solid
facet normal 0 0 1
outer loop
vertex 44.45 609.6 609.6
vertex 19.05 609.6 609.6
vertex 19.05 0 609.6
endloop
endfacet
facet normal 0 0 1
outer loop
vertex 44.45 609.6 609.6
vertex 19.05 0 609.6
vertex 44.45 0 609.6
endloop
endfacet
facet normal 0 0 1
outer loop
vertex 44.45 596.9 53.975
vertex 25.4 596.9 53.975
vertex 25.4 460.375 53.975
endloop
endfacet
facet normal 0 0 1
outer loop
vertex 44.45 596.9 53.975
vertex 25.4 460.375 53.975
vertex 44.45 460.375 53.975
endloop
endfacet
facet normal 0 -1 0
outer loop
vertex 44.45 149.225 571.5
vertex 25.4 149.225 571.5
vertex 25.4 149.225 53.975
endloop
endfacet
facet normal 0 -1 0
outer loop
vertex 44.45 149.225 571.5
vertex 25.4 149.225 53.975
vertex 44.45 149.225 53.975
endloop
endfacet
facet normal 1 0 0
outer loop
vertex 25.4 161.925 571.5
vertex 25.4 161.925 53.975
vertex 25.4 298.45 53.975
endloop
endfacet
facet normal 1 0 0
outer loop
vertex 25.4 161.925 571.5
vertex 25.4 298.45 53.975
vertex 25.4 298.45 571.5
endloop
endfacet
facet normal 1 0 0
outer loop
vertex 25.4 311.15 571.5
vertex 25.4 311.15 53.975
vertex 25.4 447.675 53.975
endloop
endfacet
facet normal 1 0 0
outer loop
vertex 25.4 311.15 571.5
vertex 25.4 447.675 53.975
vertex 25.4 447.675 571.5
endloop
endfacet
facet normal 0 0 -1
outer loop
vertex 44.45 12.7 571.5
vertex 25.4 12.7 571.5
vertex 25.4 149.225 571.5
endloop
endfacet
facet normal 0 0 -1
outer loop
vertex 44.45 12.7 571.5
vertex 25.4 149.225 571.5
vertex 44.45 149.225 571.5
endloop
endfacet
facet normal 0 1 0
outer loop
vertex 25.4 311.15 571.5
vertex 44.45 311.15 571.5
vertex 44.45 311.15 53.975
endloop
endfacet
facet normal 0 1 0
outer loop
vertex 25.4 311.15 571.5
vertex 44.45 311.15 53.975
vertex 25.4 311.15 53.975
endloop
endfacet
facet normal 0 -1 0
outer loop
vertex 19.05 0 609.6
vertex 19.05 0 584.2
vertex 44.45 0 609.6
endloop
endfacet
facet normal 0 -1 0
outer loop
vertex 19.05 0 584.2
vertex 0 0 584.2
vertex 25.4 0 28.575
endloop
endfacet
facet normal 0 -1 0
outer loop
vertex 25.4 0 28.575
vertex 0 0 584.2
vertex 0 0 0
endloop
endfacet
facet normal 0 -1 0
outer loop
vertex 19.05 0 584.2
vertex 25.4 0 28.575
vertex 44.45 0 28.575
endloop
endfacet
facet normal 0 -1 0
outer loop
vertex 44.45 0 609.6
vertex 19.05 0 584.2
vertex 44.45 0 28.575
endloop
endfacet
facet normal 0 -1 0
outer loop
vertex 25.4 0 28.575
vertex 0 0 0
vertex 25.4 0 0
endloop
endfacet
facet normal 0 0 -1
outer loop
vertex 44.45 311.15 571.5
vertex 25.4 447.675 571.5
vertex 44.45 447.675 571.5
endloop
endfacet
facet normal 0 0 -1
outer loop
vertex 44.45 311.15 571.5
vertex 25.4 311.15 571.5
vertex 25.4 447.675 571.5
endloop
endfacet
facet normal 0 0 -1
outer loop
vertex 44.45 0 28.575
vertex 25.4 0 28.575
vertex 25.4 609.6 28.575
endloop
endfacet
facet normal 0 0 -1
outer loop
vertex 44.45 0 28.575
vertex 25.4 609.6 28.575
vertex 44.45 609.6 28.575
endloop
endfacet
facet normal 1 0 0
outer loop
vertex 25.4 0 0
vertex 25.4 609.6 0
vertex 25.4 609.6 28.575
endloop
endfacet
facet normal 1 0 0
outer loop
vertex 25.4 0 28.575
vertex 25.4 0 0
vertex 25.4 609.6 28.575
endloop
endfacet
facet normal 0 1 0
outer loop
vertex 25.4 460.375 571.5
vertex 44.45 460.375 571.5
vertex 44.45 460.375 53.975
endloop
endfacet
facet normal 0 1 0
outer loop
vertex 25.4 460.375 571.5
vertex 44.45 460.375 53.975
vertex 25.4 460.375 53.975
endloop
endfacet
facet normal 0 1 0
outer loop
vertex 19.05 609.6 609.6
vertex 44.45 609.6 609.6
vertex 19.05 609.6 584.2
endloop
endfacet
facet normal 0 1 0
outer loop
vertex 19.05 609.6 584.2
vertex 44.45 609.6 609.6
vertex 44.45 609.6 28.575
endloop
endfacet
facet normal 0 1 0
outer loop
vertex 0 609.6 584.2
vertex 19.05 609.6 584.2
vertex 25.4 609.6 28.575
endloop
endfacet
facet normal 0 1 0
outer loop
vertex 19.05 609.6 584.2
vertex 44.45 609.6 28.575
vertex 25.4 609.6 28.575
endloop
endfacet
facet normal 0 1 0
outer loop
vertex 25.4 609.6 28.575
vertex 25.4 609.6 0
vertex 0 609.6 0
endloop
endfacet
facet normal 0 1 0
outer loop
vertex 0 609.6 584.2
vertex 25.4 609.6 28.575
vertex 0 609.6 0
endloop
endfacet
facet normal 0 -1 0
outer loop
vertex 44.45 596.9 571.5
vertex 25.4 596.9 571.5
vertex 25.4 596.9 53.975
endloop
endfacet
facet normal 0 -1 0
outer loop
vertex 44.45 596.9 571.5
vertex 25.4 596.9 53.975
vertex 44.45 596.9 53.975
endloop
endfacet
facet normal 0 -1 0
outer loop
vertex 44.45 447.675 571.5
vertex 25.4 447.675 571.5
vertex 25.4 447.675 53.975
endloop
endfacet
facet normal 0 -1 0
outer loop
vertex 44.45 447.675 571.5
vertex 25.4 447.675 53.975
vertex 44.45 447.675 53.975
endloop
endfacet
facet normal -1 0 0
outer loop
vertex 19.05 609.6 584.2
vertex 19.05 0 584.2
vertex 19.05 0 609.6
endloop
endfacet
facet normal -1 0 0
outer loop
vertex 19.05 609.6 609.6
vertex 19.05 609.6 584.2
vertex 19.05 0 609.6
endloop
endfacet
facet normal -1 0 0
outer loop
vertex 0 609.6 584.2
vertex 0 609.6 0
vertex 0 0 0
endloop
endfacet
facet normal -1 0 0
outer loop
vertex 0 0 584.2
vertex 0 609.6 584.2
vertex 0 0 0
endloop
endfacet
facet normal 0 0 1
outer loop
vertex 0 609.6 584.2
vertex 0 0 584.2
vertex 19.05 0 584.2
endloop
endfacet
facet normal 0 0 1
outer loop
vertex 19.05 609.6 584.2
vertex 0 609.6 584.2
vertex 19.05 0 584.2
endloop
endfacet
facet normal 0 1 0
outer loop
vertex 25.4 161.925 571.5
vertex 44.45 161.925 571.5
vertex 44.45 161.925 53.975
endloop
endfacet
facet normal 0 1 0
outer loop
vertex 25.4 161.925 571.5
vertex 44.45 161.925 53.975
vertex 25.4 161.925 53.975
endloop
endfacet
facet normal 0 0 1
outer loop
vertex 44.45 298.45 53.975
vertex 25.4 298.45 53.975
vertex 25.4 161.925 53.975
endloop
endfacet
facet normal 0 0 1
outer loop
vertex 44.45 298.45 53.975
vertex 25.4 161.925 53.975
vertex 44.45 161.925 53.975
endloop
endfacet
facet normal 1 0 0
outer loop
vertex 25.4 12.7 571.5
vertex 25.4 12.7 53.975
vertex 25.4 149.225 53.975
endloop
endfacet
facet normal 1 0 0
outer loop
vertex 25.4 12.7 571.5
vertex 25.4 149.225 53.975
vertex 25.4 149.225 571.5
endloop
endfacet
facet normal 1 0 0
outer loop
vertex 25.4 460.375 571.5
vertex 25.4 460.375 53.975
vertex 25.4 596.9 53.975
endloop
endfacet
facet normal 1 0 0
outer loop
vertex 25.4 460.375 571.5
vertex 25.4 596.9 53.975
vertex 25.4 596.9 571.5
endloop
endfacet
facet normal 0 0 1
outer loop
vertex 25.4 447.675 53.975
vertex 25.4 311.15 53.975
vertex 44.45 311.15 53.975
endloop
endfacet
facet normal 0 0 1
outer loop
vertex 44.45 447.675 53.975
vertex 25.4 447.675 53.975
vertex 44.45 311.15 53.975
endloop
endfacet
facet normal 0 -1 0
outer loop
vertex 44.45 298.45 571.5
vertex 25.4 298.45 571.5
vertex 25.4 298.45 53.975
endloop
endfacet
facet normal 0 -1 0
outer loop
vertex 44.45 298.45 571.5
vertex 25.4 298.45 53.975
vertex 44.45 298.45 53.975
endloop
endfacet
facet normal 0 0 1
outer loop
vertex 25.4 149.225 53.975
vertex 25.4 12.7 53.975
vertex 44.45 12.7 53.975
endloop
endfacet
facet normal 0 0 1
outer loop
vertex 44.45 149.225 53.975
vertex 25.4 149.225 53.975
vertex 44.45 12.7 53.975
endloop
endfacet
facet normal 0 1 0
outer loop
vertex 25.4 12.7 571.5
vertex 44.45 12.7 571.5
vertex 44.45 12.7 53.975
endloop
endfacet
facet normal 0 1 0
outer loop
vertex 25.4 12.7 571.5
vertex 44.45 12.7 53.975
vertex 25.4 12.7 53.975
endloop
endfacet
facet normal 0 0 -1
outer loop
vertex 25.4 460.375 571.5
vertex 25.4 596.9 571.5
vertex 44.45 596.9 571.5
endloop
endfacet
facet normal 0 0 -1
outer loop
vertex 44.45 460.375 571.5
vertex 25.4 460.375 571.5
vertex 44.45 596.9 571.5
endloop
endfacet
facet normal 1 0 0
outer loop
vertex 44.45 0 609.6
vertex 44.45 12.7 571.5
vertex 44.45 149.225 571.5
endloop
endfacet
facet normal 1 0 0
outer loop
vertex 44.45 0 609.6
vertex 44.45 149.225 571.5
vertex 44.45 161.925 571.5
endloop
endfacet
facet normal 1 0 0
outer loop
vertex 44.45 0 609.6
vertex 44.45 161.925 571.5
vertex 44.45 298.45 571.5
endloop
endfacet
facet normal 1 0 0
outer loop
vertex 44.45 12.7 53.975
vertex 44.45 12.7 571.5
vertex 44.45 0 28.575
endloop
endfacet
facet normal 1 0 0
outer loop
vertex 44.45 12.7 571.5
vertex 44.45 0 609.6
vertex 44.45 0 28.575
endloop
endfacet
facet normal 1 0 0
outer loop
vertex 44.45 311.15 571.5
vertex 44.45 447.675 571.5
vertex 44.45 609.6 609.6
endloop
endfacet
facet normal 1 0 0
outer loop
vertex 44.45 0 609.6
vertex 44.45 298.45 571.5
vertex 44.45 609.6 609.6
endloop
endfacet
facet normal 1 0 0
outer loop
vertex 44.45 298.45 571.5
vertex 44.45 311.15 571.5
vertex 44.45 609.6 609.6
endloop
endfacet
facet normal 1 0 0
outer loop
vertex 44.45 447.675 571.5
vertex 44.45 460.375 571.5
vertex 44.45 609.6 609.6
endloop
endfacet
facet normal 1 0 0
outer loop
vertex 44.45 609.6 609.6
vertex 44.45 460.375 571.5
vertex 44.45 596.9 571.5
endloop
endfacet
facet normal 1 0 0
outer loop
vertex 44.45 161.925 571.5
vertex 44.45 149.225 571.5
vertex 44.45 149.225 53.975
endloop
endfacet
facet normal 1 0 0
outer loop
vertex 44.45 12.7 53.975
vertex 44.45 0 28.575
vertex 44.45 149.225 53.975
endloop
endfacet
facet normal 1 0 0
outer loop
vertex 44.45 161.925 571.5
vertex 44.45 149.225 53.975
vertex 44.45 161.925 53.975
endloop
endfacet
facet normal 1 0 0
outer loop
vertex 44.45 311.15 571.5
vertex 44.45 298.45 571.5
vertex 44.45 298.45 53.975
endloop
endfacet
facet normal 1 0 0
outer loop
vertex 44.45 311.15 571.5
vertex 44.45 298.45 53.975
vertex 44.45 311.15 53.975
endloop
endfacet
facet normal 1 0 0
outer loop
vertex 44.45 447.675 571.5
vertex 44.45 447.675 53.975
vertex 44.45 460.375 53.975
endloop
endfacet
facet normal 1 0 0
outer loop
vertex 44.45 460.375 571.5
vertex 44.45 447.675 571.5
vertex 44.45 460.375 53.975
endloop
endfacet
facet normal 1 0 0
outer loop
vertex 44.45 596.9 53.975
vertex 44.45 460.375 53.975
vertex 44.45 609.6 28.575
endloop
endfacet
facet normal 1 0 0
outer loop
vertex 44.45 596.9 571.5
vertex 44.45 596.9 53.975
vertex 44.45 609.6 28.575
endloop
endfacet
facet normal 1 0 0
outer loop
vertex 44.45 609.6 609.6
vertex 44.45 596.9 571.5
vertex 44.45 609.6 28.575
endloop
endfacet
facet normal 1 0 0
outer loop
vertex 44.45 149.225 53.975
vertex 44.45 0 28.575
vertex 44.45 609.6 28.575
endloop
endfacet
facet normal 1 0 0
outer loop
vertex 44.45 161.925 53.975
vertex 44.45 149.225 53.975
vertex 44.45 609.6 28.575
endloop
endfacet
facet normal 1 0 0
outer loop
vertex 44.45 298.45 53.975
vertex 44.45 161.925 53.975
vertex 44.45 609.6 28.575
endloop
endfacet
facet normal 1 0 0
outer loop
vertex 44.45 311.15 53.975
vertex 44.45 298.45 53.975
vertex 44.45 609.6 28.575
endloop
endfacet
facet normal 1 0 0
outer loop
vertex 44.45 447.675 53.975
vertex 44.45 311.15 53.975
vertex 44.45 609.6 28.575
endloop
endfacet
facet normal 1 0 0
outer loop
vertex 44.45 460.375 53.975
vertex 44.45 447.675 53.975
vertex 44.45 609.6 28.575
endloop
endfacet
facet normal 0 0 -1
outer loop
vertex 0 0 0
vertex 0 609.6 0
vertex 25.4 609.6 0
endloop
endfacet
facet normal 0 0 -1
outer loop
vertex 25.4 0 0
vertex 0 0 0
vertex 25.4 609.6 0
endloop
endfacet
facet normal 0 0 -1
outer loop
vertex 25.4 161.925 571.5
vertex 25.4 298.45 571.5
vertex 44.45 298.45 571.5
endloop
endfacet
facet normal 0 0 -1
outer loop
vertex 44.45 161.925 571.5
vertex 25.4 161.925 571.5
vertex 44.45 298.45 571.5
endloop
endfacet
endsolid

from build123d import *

# Parameters (mm, degrees)
F1_DEPTH = 609.6
F2_W     = 50.8
F2_H     = 25.4
F3_DEPTH = 609.6
F4_W     = 25.4
F4_H     = 25.4
F5_DEPTH = 609.6
F6_W     = 25.4
F6_H     = 28.575
F7_DEPTH = 609.6
F8_W     = 19.05
F8_H     = 25.4
F8_W_2   = 25.4
F8_H_2   = 38.1
F9_DEPTH = 609.6


with BuildPart() as f1:
    # F0 (on Top) → F1 (new body)
    with BuildSketch(Plane.XY):
        Polygon((0, 609.6), (0, 0), (25.4, 0), (44.45, 0), (44.45, 12.7), (25.4, 12.7), (25.4, 149.225), (44.45, 149.225), (44.45, 161.925), (25.4, 161.925), (25.4, 298.45), (44.45, 298.45), (44.45, 311.15), (25.4, 311.15), (25.4, 447.675), (44.45, 447.675), (44.45, 460.375), (25.4, 460.375), (25.4, 596.9), (44.45, 596.9), (44.45, 609.6), (25.4, 609.6), align=None)
    extrude(amount=F1_DEPTH)

    # F2 (on face) → F3 (join)
    with BuildSketch(Plane.XZ):
        with Locations((25.4, 12.7)):
            Rectangle(F2_W, F2_H)
    extrude(amount=-F3_DEPTH)

    # F4 (on face) → F5 (cut)
    with BuildSketch(Plane.XZ):
        with Locations((12.7, 596.9)):
            Rectangle(F4_W, F4_H)
    extrude(amount=-F5_DEPTH, mode=Mode.SUBTRACT)

    # F6 (on face) → F7 (cut)
    with BuildSketch(Plane.XZ):
        with Locations((38.1, 14.2875)):
            Rectangle(F6_W, F6_H)
    extrude(amount=-F7_DEPTH, mode=Mode.SUBTRACT)

    # F8 (on face) → F9 (join)
    with BuildSketch(Plane.XZ):
        with Locations((34.925, 41.275)):
            Rectangle(F8_W, F8_H)
        with Locations((31.75, 590.55)):
            Rectangle(F8_W_2, F8_H_2)
    extrude(amount=-F9_DEPTH)


solid = f1.part
